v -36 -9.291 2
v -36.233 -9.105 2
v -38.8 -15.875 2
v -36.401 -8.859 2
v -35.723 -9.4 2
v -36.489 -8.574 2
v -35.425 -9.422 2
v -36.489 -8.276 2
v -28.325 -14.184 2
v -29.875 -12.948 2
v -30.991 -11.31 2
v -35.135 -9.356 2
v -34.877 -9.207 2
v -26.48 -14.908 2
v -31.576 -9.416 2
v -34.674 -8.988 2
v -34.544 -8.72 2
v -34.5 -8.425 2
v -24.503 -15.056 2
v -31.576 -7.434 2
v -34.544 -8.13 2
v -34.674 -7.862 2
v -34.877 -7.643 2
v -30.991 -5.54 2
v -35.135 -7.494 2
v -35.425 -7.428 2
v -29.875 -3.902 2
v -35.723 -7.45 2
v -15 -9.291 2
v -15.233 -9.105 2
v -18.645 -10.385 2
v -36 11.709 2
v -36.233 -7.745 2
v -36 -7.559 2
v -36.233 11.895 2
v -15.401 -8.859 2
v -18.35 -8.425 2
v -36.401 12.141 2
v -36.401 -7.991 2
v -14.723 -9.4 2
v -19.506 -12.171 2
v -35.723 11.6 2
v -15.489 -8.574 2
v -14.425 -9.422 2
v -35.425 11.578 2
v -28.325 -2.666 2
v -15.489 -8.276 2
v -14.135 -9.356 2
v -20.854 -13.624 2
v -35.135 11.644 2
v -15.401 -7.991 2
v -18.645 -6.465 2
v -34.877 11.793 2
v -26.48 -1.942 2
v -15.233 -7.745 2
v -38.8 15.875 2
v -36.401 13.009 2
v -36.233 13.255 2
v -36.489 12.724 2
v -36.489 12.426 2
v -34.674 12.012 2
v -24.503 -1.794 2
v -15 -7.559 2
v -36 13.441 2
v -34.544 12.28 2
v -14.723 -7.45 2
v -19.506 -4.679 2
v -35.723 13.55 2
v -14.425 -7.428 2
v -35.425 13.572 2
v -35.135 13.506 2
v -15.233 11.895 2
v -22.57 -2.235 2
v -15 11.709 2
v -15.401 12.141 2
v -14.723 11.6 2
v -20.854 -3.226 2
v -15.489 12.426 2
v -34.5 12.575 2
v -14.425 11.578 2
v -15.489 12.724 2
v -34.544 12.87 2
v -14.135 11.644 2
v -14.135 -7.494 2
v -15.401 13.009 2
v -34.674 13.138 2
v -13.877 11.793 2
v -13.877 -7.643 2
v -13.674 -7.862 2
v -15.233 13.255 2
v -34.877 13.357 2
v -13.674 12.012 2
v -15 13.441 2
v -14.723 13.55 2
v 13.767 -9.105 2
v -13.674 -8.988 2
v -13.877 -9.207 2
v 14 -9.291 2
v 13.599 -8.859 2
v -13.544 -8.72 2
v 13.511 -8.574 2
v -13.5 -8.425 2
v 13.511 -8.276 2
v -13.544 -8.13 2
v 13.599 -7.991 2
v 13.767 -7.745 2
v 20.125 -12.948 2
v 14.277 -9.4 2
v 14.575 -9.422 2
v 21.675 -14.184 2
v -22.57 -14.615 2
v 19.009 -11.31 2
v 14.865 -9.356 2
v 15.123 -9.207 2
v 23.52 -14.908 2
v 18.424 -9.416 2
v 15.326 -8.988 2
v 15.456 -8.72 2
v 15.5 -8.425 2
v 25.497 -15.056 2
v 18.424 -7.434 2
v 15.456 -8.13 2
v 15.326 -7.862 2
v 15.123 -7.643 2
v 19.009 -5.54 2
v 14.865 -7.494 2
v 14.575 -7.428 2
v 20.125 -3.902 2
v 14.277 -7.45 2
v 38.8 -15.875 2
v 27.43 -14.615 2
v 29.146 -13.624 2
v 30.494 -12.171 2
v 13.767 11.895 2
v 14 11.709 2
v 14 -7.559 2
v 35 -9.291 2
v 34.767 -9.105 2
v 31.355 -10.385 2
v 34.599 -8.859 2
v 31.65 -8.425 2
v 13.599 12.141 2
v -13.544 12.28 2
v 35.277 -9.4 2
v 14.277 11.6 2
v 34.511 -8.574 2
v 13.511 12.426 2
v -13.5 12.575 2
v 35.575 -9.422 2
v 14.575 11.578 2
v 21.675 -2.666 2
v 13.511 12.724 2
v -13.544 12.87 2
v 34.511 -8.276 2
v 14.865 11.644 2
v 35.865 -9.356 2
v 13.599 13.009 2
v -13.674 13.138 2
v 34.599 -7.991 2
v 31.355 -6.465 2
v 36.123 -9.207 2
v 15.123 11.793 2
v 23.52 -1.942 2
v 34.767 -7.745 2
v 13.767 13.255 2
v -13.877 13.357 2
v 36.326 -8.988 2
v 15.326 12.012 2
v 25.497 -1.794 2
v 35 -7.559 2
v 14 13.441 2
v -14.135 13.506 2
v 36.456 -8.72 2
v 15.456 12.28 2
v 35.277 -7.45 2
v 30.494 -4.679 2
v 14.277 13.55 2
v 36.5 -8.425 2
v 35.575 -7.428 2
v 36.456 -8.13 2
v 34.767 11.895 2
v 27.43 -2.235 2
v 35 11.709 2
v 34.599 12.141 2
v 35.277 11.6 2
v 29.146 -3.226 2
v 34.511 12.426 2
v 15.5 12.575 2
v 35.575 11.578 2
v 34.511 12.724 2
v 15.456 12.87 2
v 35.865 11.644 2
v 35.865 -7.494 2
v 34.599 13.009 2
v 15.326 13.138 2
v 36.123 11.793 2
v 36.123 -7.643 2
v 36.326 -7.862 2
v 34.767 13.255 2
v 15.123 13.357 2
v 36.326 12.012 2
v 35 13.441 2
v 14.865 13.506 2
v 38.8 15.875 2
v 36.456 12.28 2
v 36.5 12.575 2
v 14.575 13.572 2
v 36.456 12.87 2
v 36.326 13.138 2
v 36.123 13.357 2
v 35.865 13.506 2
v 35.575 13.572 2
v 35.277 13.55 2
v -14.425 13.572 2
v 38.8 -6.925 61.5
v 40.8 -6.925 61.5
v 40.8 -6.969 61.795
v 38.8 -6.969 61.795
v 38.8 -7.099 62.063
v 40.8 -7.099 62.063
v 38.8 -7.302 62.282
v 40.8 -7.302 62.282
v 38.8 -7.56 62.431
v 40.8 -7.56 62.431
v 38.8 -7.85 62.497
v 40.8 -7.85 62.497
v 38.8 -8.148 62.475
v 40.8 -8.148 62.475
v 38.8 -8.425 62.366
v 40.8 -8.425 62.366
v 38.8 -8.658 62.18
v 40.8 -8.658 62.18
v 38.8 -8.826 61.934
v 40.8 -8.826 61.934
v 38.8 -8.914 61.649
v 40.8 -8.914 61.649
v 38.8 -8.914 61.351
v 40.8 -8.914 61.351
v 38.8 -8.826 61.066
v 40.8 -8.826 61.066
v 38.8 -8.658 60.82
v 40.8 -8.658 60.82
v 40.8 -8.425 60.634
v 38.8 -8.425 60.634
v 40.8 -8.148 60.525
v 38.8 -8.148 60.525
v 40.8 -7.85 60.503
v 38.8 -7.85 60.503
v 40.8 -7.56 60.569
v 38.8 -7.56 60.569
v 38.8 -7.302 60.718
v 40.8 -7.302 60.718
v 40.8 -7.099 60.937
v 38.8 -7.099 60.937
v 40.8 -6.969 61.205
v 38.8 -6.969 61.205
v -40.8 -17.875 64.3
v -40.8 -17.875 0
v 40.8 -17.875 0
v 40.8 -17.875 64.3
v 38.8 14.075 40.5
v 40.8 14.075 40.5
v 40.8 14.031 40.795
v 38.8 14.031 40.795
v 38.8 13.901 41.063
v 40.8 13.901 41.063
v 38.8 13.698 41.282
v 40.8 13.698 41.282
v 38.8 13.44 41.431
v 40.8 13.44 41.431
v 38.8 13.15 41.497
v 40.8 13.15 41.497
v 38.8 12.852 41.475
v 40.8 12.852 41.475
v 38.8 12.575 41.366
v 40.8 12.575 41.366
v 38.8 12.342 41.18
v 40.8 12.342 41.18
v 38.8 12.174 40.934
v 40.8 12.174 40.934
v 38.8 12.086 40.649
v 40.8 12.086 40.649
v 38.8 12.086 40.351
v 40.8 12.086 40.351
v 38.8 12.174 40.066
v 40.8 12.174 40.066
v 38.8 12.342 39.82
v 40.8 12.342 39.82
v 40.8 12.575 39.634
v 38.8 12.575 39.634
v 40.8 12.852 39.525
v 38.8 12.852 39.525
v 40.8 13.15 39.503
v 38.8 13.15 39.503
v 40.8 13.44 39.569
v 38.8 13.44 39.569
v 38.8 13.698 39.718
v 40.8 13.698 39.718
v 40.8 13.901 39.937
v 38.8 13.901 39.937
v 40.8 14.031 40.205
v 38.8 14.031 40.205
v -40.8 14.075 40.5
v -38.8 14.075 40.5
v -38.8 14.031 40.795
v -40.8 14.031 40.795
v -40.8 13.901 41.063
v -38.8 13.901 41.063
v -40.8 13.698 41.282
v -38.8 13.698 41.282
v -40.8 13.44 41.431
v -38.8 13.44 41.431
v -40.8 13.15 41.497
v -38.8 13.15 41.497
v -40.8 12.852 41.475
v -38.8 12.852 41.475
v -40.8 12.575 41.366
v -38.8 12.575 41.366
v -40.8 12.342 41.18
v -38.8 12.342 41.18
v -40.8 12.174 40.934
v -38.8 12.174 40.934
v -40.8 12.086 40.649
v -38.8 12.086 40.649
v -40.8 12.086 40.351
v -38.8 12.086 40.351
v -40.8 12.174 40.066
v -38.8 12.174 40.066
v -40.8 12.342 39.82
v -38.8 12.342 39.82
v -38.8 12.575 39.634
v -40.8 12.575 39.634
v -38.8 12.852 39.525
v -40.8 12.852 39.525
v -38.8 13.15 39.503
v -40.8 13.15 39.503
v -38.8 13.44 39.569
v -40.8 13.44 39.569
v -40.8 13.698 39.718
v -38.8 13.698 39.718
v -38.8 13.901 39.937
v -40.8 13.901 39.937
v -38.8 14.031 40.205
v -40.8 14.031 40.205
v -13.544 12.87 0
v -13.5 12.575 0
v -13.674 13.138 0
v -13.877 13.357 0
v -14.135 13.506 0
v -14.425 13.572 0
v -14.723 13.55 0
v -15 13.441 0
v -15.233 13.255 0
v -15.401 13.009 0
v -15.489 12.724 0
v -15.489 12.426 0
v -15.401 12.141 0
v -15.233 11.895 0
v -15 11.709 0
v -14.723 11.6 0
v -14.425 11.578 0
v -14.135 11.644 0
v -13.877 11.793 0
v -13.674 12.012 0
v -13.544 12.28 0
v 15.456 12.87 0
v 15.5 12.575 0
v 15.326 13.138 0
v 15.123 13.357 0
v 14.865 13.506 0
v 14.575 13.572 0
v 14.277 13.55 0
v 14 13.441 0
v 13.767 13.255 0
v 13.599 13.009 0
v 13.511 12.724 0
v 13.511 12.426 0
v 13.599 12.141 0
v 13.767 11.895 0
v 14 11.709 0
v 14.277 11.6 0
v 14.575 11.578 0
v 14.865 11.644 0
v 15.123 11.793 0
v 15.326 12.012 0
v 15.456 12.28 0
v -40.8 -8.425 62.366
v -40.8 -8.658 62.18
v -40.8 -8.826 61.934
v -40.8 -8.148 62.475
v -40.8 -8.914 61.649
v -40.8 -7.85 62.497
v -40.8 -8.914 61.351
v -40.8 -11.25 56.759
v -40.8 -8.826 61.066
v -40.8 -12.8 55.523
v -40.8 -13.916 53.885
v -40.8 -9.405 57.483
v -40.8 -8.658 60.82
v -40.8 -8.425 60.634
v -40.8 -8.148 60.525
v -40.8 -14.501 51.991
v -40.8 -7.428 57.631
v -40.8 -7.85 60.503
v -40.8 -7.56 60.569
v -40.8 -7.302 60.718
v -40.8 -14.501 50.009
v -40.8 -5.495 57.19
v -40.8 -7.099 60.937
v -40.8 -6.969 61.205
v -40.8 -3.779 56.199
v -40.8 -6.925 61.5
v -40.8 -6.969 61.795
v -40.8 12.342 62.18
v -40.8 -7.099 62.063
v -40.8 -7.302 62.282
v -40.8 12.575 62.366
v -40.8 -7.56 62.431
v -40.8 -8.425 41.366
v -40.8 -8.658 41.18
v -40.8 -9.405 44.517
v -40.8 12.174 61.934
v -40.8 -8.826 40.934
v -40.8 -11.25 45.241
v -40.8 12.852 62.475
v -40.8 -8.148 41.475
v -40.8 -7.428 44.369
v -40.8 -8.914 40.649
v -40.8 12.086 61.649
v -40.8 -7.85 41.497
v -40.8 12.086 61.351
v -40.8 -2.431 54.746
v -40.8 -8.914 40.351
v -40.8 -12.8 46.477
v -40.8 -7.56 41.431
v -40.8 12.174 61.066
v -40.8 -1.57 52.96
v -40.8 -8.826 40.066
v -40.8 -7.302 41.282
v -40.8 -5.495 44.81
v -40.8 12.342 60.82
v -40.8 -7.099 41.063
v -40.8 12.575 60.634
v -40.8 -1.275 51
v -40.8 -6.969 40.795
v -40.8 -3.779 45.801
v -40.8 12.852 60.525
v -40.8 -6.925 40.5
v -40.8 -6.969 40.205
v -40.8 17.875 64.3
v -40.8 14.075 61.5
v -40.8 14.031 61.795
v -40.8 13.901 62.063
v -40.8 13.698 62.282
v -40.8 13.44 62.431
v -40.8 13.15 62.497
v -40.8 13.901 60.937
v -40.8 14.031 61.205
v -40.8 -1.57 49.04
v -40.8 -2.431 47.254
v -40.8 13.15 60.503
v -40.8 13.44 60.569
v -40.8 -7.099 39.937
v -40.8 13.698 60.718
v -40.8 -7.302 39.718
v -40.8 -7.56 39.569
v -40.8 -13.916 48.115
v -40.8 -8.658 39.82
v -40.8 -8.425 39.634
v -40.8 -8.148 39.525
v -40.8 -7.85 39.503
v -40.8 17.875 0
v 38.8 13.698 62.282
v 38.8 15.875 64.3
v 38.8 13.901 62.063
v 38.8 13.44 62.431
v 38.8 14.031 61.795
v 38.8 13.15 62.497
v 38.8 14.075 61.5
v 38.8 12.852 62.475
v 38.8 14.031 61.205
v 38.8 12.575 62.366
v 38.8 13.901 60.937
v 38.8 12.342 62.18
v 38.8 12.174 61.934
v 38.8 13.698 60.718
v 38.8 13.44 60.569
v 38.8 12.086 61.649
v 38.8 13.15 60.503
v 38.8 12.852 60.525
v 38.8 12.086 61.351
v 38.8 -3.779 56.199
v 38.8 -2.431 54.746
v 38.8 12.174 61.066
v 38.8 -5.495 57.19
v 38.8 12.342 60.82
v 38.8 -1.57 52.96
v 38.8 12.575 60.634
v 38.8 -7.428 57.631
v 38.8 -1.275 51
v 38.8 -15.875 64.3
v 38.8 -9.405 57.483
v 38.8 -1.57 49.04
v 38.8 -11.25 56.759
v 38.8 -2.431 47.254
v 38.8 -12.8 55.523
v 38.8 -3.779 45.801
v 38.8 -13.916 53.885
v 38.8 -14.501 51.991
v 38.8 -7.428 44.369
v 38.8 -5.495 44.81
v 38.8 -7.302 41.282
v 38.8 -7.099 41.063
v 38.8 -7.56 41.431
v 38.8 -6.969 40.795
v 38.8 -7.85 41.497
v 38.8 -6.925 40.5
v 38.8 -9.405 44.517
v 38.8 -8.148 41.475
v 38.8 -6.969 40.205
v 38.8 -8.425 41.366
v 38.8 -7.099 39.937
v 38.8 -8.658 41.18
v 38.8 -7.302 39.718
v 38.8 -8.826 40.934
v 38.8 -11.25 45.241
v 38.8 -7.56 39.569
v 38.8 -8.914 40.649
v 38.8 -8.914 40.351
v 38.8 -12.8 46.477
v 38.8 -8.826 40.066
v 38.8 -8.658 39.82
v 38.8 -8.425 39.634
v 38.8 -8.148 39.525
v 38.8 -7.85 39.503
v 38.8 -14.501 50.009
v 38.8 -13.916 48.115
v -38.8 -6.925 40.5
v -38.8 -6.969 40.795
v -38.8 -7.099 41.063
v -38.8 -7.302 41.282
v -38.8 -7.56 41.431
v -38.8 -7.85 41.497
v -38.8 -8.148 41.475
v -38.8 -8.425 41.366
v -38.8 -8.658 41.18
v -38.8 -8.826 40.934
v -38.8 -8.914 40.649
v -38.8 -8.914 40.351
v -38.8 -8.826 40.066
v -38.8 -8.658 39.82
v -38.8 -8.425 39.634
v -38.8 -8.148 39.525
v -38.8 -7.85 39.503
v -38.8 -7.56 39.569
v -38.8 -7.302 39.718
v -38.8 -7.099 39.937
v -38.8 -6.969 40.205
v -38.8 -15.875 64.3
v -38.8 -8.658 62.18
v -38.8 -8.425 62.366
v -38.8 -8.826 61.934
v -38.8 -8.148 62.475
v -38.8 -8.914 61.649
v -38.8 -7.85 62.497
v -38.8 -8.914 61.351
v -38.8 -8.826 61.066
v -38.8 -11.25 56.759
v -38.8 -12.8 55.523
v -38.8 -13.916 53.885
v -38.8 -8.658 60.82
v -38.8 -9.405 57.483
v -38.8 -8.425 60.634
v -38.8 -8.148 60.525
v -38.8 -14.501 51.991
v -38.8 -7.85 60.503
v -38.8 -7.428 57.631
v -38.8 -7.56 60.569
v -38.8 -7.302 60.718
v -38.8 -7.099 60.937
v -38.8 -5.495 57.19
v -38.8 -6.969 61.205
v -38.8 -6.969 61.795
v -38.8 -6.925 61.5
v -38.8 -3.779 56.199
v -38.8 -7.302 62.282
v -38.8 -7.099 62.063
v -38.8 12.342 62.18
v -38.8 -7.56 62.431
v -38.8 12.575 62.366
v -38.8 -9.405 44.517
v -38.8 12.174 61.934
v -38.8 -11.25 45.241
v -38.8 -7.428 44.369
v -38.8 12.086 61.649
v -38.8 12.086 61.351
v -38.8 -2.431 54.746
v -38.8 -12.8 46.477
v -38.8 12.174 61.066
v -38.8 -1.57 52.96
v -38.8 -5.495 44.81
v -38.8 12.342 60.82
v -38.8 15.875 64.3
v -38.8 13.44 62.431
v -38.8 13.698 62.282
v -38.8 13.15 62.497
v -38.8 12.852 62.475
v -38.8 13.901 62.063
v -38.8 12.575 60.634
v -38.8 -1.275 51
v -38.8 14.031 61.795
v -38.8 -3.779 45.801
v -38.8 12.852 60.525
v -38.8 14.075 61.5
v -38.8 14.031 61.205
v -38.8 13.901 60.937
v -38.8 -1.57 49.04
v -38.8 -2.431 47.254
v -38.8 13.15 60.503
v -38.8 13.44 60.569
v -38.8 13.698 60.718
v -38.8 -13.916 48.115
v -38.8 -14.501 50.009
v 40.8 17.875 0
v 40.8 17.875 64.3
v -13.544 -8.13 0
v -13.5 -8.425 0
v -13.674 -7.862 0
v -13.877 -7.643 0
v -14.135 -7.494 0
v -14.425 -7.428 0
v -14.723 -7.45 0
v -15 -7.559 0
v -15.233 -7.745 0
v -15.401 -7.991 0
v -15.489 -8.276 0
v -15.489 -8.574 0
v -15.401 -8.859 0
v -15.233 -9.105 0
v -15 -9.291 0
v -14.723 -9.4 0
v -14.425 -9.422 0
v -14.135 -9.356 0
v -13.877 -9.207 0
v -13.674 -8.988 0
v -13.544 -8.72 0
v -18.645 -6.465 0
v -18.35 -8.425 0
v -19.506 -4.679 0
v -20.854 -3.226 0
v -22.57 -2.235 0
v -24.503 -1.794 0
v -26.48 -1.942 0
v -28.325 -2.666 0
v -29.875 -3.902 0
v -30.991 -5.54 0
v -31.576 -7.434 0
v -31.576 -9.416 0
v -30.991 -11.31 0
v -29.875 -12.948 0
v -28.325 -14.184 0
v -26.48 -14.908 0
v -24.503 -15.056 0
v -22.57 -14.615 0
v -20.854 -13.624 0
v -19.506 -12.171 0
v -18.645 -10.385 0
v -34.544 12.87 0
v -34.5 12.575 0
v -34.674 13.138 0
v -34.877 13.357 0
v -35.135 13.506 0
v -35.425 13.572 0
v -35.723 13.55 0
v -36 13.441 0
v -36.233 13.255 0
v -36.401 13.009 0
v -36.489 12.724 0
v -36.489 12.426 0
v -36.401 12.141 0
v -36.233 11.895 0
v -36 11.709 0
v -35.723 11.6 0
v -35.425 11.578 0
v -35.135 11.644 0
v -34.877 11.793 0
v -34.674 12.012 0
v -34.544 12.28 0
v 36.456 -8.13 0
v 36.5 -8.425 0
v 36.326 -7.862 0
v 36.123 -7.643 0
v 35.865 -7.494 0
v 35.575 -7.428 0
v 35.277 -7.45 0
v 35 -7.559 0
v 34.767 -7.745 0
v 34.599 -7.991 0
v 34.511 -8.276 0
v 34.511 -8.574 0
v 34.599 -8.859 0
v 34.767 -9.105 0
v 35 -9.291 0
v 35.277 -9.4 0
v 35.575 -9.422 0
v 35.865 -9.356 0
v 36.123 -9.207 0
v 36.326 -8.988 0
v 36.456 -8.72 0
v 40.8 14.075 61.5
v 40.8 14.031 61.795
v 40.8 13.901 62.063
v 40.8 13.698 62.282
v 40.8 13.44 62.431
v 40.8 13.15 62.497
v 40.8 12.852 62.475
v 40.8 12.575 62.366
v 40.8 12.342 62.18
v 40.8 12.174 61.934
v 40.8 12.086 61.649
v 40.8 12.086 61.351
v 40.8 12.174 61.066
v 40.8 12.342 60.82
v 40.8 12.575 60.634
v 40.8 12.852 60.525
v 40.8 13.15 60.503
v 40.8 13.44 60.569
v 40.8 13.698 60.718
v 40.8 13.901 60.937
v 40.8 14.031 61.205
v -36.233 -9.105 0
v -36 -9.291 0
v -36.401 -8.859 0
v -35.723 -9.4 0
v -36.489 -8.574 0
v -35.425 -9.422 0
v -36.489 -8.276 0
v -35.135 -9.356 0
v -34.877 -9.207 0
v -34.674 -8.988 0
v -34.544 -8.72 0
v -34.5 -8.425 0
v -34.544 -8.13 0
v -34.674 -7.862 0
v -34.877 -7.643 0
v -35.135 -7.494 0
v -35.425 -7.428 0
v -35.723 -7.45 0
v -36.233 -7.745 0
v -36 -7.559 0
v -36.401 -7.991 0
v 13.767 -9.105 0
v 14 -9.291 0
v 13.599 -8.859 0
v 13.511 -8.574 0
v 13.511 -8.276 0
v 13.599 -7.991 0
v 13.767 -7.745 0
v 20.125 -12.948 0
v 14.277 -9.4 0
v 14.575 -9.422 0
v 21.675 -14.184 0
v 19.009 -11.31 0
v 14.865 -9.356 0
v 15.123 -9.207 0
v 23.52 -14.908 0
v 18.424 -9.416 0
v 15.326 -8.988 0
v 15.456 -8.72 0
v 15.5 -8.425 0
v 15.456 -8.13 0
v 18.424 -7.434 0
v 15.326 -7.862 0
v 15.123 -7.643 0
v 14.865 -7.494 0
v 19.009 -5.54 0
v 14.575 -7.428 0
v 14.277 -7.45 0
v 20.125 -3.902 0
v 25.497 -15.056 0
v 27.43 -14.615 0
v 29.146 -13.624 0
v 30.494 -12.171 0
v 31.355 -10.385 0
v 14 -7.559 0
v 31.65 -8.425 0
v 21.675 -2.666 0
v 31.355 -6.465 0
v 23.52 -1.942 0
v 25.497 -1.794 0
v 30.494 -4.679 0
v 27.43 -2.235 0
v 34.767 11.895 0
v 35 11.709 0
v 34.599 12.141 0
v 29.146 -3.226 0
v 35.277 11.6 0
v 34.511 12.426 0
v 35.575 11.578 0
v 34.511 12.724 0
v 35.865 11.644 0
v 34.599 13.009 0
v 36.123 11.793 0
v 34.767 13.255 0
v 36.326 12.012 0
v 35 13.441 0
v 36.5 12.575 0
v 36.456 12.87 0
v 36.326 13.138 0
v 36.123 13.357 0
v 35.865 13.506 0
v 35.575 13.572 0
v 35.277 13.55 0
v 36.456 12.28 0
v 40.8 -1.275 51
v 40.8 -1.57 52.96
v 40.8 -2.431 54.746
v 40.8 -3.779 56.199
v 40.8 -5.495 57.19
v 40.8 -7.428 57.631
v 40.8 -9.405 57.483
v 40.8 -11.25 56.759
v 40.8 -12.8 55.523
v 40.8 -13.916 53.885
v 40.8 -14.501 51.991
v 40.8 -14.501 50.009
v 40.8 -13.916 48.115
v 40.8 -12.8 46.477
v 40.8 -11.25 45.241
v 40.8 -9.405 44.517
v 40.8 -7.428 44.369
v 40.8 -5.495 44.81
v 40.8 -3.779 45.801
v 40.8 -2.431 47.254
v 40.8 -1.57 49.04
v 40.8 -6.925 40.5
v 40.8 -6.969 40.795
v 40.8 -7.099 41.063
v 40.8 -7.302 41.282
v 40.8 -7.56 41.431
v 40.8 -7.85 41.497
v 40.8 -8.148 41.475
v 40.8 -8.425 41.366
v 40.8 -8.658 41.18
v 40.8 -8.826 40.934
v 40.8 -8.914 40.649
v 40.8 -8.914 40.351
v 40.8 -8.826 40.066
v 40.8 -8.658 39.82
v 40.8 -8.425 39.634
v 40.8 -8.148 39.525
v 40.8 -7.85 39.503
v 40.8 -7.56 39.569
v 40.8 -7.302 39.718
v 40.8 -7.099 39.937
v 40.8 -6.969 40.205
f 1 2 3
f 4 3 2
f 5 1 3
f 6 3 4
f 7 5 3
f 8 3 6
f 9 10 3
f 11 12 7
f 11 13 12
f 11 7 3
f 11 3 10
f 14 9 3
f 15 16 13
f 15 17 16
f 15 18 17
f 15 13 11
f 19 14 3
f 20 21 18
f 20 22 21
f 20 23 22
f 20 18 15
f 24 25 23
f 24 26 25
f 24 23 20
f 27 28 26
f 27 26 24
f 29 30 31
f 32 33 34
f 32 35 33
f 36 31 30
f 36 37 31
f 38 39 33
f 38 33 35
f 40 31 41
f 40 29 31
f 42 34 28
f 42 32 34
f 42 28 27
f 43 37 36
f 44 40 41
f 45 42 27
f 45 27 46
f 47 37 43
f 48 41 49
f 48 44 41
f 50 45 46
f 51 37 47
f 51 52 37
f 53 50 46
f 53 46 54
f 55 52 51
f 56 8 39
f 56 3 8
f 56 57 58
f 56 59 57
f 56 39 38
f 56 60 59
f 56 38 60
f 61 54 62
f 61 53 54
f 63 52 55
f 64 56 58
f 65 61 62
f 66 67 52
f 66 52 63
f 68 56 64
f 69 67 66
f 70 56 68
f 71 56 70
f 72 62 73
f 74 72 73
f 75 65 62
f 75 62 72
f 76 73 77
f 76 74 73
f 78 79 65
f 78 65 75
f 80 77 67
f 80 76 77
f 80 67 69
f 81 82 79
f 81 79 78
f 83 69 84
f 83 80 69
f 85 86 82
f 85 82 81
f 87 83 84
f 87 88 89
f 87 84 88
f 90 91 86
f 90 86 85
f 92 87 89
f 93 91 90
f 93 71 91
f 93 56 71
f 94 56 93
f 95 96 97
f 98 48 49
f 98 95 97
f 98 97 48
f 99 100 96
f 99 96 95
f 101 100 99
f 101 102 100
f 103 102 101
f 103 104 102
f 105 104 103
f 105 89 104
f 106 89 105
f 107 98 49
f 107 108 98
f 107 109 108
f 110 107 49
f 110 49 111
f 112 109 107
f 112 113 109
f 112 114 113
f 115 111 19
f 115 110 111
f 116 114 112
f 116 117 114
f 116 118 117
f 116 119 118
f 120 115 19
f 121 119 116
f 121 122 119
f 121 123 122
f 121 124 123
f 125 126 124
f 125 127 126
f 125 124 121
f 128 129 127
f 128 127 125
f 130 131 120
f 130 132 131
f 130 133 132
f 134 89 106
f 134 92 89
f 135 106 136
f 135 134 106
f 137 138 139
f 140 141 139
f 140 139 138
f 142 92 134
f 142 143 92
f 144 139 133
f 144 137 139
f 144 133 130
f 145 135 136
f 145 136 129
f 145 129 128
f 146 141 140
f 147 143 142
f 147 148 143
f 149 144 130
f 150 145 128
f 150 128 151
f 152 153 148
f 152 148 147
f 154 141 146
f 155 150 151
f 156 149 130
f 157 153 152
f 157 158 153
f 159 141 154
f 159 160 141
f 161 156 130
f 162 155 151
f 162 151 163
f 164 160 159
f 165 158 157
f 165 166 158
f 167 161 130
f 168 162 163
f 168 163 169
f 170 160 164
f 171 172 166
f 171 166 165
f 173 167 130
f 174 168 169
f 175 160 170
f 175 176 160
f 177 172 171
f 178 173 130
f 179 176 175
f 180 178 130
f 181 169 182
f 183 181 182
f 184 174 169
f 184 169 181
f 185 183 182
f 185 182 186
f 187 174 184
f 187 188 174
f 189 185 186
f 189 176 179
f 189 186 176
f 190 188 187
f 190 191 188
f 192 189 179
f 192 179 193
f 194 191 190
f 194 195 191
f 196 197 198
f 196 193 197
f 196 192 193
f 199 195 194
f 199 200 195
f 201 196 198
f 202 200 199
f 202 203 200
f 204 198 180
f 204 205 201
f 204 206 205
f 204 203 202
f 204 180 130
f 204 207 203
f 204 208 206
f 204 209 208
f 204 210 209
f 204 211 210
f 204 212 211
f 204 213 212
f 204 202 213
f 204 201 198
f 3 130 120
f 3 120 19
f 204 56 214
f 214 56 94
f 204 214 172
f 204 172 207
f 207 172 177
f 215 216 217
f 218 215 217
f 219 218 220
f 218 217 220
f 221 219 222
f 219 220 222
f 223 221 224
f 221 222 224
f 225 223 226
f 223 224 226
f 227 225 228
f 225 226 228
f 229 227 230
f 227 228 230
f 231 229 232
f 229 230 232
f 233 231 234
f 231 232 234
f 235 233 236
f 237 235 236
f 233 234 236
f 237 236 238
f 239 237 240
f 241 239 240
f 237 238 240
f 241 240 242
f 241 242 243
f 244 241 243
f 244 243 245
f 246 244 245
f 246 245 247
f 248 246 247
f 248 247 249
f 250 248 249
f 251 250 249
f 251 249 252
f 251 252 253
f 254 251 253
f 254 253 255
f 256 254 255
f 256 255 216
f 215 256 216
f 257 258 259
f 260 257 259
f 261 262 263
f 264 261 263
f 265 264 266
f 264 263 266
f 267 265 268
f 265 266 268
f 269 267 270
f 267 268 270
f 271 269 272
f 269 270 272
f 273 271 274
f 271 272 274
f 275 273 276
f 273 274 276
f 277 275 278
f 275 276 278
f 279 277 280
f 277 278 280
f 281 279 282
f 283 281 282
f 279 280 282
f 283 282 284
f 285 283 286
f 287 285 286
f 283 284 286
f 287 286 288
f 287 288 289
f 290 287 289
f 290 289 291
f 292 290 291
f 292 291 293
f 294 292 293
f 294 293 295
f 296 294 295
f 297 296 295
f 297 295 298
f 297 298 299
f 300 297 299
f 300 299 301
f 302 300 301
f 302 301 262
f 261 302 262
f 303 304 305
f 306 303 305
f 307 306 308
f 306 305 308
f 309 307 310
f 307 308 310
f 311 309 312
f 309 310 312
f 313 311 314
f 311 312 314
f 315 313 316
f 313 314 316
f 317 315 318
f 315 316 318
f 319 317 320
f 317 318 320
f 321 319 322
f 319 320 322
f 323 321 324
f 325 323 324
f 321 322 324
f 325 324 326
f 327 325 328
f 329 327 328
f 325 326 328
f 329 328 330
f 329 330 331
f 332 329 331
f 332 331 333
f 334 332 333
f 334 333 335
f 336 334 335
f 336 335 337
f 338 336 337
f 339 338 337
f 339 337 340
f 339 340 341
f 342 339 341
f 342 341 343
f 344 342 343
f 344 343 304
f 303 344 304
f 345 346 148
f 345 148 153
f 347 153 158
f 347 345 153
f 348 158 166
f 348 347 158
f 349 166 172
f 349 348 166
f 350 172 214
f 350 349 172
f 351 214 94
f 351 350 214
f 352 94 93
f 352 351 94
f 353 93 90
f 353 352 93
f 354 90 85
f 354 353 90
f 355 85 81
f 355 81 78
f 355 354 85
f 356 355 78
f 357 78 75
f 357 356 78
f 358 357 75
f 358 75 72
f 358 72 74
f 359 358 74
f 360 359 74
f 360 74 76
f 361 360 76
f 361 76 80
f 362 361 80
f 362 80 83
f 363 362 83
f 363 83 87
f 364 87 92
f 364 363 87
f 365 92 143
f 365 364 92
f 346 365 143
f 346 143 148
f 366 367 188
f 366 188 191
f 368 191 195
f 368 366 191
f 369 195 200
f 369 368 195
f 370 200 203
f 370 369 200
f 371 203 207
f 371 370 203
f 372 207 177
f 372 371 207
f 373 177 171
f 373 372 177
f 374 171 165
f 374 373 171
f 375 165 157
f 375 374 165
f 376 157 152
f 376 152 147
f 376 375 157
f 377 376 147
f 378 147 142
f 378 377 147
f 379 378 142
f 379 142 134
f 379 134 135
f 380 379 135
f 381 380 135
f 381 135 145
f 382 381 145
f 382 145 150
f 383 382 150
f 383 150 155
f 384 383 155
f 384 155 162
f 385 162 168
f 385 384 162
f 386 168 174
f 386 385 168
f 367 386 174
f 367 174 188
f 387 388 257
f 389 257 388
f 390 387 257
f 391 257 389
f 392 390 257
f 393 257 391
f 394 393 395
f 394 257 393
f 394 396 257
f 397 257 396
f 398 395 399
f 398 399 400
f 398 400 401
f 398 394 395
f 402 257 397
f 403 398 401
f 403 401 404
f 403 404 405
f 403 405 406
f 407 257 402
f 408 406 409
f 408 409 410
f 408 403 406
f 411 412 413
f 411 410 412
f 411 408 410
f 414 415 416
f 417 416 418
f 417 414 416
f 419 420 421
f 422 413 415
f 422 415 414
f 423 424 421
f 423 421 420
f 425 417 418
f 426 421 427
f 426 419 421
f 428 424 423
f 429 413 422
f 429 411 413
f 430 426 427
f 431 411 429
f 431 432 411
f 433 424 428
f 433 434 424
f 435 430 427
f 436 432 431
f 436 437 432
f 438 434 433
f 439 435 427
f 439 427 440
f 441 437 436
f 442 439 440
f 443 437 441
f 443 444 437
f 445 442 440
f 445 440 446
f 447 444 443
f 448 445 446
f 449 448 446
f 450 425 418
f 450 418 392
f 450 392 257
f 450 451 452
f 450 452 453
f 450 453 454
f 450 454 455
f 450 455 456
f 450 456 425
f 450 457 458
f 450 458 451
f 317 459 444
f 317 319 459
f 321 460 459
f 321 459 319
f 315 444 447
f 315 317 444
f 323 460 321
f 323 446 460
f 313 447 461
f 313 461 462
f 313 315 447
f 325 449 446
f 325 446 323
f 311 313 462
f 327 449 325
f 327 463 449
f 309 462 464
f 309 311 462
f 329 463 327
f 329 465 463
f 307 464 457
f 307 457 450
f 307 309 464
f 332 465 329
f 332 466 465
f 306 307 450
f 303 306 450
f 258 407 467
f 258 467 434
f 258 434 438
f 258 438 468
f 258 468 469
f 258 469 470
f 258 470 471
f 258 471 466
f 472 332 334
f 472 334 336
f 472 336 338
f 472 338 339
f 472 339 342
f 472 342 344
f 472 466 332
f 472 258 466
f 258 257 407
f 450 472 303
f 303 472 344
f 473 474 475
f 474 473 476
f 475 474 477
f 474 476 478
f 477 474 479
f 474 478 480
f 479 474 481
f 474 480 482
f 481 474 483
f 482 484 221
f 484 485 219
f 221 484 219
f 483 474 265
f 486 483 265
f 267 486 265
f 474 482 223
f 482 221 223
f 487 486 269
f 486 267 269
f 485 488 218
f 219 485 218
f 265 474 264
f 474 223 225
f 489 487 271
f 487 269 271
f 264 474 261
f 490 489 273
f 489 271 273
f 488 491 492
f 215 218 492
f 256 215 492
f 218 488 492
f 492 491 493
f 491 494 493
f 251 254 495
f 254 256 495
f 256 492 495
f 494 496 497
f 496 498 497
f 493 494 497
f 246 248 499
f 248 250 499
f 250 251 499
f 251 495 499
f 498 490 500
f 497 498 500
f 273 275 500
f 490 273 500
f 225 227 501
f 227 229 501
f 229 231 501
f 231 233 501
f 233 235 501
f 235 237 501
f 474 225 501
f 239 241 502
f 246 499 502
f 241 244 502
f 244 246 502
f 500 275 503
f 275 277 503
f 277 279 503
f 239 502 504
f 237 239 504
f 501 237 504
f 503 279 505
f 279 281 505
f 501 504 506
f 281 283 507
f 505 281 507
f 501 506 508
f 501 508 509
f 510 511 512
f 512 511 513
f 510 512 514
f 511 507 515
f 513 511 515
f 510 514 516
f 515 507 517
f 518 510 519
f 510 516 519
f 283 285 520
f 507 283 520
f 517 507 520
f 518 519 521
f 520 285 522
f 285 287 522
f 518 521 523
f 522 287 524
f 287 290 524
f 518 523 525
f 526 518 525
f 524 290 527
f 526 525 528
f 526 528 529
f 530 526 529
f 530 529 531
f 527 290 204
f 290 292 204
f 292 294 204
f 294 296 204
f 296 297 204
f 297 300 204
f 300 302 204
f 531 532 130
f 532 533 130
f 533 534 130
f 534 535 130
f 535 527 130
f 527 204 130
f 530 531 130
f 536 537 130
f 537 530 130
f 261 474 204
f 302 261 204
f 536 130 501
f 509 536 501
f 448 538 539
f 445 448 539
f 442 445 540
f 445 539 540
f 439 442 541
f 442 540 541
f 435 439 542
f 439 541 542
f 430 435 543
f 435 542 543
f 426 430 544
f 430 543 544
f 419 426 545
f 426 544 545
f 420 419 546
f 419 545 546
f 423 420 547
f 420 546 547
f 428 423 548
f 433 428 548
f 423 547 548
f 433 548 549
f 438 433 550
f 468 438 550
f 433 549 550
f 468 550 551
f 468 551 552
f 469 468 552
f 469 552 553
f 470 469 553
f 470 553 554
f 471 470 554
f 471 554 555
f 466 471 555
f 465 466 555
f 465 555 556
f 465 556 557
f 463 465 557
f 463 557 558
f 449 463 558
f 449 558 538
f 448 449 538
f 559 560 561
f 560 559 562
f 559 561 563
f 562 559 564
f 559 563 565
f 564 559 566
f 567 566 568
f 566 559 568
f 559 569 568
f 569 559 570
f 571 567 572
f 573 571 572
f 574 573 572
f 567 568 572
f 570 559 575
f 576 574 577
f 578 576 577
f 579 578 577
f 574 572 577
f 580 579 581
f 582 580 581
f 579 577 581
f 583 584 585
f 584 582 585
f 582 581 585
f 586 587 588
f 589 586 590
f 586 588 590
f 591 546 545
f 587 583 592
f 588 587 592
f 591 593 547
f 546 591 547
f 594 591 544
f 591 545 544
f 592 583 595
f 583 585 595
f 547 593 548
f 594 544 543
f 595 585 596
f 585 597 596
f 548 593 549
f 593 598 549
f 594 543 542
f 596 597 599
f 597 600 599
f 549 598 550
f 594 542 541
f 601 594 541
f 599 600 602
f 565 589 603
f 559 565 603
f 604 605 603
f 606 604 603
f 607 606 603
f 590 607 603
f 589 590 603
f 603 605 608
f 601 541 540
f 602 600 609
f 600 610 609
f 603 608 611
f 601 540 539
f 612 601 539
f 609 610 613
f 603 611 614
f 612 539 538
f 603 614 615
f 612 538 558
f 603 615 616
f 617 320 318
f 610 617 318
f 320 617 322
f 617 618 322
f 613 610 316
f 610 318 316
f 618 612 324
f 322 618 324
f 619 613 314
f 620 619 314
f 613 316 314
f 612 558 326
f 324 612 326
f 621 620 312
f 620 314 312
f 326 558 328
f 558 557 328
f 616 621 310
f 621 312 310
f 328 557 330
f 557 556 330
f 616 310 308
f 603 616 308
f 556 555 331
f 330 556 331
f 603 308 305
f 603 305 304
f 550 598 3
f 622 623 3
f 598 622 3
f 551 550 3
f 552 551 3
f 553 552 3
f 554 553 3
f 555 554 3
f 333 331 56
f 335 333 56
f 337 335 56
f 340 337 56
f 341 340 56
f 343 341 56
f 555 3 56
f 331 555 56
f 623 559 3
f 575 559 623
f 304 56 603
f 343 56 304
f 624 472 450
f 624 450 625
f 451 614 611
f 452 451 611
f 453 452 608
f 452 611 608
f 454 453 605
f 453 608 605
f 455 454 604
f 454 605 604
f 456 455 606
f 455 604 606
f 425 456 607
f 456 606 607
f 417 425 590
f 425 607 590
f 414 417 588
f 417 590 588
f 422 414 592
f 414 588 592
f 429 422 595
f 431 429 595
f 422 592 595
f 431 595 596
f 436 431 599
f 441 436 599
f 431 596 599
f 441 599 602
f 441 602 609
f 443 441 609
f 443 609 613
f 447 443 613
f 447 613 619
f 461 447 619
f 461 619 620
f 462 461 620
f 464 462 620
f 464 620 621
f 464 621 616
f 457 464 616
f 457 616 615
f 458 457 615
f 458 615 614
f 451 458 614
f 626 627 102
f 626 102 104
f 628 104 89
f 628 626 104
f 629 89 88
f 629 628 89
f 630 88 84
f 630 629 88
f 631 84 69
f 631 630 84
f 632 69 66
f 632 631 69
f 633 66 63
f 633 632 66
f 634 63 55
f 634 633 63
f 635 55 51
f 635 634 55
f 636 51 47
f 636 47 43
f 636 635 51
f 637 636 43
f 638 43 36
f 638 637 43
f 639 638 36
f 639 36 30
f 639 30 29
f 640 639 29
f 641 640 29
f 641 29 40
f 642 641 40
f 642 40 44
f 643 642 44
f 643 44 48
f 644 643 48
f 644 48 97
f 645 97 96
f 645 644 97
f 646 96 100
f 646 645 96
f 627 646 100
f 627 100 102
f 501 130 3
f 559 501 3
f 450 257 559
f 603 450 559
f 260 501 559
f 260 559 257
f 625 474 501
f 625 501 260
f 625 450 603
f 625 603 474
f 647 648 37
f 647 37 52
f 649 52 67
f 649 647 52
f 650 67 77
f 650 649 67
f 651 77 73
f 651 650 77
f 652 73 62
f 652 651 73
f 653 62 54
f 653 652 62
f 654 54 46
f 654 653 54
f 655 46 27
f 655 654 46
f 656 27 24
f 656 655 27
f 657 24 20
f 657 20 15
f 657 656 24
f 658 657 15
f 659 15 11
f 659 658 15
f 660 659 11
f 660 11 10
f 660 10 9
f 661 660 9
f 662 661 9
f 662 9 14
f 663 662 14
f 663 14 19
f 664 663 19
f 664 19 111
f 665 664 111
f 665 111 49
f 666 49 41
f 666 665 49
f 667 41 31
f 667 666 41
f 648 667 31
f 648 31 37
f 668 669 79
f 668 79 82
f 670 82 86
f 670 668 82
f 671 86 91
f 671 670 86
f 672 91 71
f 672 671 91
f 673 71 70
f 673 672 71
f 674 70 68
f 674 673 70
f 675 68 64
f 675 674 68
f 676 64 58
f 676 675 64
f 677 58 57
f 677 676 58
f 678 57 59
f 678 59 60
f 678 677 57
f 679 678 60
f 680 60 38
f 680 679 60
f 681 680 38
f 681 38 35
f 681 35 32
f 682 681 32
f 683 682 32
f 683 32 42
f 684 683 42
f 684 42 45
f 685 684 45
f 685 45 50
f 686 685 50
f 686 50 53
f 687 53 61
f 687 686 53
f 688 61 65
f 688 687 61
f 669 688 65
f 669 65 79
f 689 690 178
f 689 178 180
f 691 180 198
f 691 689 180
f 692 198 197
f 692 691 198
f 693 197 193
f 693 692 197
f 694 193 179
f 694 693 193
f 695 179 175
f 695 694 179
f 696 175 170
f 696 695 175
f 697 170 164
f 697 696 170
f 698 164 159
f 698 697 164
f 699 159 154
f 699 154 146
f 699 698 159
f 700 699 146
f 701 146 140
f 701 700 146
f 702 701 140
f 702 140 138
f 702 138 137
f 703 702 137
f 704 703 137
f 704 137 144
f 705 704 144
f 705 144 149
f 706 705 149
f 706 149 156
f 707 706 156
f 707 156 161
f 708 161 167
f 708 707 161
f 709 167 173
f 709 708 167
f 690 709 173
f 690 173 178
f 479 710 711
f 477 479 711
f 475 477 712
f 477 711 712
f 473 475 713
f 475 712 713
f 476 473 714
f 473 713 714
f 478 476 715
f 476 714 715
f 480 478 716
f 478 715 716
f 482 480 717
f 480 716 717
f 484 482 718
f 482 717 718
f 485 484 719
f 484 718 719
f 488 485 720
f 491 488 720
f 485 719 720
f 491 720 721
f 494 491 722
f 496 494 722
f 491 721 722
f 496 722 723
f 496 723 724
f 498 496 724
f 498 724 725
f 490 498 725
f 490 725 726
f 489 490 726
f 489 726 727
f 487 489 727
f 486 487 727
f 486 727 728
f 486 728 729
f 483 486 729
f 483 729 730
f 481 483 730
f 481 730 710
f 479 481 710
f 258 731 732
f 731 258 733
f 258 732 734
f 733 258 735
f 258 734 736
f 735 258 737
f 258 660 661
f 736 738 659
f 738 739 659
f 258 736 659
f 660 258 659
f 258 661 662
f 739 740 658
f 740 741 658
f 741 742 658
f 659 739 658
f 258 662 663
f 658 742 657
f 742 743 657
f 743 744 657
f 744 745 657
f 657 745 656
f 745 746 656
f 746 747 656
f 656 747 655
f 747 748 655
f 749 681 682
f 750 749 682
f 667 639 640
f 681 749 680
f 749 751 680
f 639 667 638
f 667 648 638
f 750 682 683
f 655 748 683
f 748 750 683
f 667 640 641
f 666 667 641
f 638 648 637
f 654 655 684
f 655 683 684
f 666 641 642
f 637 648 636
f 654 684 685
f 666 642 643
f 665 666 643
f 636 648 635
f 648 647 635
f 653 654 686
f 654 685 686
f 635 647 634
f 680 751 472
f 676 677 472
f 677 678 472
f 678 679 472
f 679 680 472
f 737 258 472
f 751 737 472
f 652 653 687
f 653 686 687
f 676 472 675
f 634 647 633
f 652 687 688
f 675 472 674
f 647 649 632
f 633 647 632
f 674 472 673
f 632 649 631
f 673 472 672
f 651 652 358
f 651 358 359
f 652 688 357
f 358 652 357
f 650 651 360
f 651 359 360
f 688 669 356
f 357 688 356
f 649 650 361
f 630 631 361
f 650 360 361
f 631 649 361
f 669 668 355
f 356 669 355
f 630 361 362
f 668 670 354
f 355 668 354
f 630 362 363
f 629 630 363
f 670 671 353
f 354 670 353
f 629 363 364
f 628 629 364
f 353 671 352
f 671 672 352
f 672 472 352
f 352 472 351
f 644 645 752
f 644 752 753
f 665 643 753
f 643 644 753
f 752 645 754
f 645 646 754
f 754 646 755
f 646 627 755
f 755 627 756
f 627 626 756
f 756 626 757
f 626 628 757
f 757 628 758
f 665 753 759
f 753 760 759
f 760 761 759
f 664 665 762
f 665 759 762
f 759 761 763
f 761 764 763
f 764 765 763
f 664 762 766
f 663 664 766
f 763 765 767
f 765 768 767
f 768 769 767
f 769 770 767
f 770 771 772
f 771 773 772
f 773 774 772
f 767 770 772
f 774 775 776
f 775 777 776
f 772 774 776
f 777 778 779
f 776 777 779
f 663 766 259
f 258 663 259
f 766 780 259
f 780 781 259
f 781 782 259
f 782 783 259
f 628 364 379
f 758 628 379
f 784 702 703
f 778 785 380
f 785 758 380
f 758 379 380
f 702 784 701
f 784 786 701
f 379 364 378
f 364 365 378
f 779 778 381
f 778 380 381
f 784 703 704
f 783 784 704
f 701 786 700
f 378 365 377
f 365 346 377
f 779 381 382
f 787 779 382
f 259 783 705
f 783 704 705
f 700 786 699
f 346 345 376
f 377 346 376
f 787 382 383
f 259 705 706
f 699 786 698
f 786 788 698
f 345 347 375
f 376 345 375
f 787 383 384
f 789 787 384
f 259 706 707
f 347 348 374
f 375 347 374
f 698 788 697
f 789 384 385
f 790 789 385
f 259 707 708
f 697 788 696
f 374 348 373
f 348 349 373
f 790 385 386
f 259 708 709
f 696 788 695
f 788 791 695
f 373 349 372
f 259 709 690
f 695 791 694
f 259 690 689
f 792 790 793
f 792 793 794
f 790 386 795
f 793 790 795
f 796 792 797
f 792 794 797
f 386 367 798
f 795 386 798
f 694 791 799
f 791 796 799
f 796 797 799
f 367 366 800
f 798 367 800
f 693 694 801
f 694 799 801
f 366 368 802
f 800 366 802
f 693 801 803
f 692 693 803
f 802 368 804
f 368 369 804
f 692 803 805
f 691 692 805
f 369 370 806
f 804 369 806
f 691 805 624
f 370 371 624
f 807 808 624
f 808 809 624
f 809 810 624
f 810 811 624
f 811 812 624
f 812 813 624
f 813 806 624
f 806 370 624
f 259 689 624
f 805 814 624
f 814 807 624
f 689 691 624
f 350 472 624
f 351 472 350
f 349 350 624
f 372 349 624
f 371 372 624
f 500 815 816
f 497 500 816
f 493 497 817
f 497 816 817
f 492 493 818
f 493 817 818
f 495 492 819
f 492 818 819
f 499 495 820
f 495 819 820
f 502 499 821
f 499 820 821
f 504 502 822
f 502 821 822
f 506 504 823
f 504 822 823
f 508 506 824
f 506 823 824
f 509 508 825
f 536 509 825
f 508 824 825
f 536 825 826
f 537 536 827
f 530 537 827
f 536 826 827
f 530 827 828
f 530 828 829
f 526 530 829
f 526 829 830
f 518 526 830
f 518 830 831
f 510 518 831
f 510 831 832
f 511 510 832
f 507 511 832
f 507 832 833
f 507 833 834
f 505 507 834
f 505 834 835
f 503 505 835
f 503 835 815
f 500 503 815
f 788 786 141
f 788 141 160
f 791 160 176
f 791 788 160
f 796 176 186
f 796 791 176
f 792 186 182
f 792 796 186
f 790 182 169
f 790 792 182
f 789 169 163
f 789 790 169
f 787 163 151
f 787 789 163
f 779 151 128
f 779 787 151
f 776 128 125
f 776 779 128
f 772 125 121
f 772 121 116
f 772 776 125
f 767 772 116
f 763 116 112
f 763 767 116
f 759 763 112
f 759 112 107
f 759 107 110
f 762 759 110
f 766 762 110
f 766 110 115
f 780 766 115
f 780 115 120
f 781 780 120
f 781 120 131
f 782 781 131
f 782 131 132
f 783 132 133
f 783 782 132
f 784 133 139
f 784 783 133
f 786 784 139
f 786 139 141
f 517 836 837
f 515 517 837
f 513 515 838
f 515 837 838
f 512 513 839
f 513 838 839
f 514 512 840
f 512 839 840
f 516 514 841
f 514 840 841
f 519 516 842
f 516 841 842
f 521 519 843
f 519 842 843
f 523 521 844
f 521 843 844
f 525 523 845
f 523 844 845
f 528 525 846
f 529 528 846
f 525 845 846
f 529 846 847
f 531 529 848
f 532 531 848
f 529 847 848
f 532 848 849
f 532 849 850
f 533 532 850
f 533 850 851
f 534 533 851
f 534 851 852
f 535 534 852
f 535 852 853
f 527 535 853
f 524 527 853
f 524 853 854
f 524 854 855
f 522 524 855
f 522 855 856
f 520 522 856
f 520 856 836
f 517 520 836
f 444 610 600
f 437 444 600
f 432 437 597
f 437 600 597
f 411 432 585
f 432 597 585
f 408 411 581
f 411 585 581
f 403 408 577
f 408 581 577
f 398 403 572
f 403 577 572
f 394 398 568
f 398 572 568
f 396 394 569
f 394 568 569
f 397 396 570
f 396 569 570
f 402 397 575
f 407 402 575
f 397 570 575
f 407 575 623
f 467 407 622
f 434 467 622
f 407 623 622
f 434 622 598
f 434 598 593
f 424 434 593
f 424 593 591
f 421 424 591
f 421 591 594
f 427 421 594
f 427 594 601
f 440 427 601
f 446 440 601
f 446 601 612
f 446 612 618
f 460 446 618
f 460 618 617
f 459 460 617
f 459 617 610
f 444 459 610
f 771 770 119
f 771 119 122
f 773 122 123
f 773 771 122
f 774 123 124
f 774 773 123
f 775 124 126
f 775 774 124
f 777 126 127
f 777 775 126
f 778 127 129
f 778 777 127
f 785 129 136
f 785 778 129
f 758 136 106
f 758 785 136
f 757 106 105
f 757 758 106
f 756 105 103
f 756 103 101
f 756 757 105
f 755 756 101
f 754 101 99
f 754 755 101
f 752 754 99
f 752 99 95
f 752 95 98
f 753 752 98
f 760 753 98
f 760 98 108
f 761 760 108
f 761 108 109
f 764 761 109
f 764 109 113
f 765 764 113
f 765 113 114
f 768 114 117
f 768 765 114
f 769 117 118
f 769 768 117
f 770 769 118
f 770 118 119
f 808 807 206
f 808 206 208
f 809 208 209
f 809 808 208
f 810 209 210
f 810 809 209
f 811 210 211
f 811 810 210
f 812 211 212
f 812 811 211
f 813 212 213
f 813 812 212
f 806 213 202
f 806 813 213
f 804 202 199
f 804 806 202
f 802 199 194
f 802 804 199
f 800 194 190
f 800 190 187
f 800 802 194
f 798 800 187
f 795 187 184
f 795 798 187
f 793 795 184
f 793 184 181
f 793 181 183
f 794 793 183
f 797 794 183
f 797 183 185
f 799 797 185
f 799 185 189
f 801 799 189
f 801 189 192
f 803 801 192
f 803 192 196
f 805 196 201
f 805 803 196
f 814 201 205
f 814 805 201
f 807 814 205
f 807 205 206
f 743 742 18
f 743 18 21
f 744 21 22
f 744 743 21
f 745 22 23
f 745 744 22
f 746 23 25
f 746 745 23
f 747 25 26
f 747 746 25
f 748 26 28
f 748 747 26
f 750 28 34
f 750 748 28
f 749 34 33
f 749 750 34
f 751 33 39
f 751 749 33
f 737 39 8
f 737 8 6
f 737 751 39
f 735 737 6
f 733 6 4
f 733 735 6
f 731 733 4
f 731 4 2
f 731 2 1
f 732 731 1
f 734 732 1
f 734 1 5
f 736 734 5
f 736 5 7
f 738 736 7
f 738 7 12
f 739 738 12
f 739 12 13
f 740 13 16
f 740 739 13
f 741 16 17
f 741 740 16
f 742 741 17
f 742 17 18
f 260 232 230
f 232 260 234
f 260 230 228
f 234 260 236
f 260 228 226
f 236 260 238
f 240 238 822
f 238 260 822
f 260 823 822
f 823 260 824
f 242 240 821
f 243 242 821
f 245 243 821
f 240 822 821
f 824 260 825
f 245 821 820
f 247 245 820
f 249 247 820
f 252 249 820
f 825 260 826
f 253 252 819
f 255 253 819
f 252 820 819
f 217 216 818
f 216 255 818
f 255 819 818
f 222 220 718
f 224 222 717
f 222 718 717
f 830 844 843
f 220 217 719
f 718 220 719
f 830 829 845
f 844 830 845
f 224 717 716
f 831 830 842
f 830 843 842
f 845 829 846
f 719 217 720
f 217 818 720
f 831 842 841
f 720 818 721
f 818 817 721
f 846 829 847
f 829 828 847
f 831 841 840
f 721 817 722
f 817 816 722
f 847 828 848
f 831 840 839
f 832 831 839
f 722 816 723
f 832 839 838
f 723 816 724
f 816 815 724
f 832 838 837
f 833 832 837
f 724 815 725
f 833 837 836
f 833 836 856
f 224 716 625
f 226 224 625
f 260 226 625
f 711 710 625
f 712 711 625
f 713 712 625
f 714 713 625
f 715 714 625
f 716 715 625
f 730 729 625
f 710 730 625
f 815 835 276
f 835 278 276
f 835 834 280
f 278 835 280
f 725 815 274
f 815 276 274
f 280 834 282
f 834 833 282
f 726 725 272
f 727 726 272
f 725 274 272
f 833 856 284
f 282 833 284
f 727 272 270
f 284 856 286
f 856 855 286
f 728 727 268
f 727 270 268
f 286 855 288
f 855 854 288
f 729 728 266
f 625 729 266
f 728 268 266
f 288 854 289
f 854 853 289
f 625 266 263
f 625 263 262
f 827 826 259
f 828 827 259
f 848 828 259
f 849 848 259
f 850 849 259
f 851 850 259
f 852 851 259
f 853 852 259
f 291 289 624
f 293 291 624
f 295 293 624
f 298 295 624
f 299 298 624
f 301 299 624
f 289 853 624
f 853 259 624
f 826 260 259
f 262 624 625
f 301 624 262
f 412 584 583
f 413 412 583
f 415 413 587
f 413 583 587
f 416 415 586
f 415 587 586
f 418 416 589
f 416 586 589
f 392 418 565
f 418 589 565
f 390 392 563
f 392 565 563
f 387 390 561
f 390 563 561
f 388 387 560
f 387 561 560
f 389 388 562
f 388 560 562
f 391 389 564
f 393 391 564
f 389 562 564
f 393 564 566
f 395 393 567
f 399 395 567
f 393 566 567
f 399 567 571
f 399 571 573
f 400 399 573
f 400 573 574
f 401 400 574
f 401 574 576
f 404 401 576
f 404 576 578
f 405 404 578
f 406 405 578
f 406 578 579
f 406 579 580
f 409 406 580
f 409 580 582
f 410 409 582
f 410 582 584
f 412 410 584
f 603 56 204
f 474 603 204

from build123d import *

# Parameters (mm, degrees)
F0_W     = 81.6
F0_H     = 35.75
F0_R     = 1
F0_R_2   = 6.65
F1_DEPTH = 2
F2_DEPTH = 64.3
F3_R     = 6.65
F3_R_2   = 1
F4_DEPTH = 81.601


with BuildPart() as f1:
    # F0 (on Top) → F1 (new body)
    with BuildSketch(Plane.XY):
        Rectangle(F0_W, F0_H)
        Polygon((-38.8, -15.875), (-38.8, 15.875), (0, 15.875), (38.8, 15.875), (38.8, -15.875), (0, -15.875), align=None, mode=Mode.SUBTRACT)
        Polygon((0, 15.875), (-38.8, 15.875), (-38.8, -15.875), (0, -15.875), (38.8, -15.875), (38.8, 15.875), align=None)
        with Locations((-35.5, -8.425)):
            Circle(F0_R, mode=Mode.SUBTRACT)
        with Locations((-25, -8.425)):
            Circle(F0_R_2, mode=Mode.SUBTRACT)
        with Locations((-14.5, -8.425)):
            Circle(F0_R, mode=Mode.SUBTRACT)
        with Locations((14.5, -8.425)):
            Circle(F0_R, mode=Mode.SUBTRACT)
        with Locations((25, -8.425)):
            Circle(F0_R_2, mode=Mode.SUBTRACT)
        with Locations((35.5, -8.425)):
            Circle(F0_R, mode=Mode.SUBTRACT)
        with Locations((-35.5, 12.575)):
            Circle(F0_R, mode=Mode.SUBTRACT)
        with Locations((-14.5, 12.575)):
            Circle(F0_R, mode=Mode.SUBTRACT)
        with Locations((14.5, 12.575)):
            Circle(F0_R, mode=Mode.SUBTRACT)
        with Locations((35.5, 12.575)):
            Circle(F0_R, mode=Mode.SUBTRACT)
    extrude(amount=F1_DEPTH)

    # F0 (on Top) → F2 (join)
    with BuildSketch(Plane.XY):
        Rectangle(F0_W, F0_H)
        Polygon((-38.8, -15.875), (-38.8, 15.875), (0, 15.875), (38.8, 15.875), (38.8, -15.875), (0, -15.875), align=None, mode=Mode.SUBTRACT)
    extrude(amount=F2_DEPTH)

    # F3 (on face) → F4 (cut, through all)
    with BuildSketch(Plane.YZ.offset(40.8)):
        with Locations((-7.925, 51)):
            Circle(F3_R)
        with Locations((-7.925, 61.5)):
            Circle(F3_R_2)
        with Locations((-7.925, 40.5)):
            Circle(F3_R_2)
        with Locations((13.075, 40.5)):
            Circle(F3_R_2)
        with Locations((13.075, 61.5)):
            Circle(F3_R_2)
    extrude(amount=-F4_DEPTH, mode=Mode.SUBTRACT)


solid = f1.part
